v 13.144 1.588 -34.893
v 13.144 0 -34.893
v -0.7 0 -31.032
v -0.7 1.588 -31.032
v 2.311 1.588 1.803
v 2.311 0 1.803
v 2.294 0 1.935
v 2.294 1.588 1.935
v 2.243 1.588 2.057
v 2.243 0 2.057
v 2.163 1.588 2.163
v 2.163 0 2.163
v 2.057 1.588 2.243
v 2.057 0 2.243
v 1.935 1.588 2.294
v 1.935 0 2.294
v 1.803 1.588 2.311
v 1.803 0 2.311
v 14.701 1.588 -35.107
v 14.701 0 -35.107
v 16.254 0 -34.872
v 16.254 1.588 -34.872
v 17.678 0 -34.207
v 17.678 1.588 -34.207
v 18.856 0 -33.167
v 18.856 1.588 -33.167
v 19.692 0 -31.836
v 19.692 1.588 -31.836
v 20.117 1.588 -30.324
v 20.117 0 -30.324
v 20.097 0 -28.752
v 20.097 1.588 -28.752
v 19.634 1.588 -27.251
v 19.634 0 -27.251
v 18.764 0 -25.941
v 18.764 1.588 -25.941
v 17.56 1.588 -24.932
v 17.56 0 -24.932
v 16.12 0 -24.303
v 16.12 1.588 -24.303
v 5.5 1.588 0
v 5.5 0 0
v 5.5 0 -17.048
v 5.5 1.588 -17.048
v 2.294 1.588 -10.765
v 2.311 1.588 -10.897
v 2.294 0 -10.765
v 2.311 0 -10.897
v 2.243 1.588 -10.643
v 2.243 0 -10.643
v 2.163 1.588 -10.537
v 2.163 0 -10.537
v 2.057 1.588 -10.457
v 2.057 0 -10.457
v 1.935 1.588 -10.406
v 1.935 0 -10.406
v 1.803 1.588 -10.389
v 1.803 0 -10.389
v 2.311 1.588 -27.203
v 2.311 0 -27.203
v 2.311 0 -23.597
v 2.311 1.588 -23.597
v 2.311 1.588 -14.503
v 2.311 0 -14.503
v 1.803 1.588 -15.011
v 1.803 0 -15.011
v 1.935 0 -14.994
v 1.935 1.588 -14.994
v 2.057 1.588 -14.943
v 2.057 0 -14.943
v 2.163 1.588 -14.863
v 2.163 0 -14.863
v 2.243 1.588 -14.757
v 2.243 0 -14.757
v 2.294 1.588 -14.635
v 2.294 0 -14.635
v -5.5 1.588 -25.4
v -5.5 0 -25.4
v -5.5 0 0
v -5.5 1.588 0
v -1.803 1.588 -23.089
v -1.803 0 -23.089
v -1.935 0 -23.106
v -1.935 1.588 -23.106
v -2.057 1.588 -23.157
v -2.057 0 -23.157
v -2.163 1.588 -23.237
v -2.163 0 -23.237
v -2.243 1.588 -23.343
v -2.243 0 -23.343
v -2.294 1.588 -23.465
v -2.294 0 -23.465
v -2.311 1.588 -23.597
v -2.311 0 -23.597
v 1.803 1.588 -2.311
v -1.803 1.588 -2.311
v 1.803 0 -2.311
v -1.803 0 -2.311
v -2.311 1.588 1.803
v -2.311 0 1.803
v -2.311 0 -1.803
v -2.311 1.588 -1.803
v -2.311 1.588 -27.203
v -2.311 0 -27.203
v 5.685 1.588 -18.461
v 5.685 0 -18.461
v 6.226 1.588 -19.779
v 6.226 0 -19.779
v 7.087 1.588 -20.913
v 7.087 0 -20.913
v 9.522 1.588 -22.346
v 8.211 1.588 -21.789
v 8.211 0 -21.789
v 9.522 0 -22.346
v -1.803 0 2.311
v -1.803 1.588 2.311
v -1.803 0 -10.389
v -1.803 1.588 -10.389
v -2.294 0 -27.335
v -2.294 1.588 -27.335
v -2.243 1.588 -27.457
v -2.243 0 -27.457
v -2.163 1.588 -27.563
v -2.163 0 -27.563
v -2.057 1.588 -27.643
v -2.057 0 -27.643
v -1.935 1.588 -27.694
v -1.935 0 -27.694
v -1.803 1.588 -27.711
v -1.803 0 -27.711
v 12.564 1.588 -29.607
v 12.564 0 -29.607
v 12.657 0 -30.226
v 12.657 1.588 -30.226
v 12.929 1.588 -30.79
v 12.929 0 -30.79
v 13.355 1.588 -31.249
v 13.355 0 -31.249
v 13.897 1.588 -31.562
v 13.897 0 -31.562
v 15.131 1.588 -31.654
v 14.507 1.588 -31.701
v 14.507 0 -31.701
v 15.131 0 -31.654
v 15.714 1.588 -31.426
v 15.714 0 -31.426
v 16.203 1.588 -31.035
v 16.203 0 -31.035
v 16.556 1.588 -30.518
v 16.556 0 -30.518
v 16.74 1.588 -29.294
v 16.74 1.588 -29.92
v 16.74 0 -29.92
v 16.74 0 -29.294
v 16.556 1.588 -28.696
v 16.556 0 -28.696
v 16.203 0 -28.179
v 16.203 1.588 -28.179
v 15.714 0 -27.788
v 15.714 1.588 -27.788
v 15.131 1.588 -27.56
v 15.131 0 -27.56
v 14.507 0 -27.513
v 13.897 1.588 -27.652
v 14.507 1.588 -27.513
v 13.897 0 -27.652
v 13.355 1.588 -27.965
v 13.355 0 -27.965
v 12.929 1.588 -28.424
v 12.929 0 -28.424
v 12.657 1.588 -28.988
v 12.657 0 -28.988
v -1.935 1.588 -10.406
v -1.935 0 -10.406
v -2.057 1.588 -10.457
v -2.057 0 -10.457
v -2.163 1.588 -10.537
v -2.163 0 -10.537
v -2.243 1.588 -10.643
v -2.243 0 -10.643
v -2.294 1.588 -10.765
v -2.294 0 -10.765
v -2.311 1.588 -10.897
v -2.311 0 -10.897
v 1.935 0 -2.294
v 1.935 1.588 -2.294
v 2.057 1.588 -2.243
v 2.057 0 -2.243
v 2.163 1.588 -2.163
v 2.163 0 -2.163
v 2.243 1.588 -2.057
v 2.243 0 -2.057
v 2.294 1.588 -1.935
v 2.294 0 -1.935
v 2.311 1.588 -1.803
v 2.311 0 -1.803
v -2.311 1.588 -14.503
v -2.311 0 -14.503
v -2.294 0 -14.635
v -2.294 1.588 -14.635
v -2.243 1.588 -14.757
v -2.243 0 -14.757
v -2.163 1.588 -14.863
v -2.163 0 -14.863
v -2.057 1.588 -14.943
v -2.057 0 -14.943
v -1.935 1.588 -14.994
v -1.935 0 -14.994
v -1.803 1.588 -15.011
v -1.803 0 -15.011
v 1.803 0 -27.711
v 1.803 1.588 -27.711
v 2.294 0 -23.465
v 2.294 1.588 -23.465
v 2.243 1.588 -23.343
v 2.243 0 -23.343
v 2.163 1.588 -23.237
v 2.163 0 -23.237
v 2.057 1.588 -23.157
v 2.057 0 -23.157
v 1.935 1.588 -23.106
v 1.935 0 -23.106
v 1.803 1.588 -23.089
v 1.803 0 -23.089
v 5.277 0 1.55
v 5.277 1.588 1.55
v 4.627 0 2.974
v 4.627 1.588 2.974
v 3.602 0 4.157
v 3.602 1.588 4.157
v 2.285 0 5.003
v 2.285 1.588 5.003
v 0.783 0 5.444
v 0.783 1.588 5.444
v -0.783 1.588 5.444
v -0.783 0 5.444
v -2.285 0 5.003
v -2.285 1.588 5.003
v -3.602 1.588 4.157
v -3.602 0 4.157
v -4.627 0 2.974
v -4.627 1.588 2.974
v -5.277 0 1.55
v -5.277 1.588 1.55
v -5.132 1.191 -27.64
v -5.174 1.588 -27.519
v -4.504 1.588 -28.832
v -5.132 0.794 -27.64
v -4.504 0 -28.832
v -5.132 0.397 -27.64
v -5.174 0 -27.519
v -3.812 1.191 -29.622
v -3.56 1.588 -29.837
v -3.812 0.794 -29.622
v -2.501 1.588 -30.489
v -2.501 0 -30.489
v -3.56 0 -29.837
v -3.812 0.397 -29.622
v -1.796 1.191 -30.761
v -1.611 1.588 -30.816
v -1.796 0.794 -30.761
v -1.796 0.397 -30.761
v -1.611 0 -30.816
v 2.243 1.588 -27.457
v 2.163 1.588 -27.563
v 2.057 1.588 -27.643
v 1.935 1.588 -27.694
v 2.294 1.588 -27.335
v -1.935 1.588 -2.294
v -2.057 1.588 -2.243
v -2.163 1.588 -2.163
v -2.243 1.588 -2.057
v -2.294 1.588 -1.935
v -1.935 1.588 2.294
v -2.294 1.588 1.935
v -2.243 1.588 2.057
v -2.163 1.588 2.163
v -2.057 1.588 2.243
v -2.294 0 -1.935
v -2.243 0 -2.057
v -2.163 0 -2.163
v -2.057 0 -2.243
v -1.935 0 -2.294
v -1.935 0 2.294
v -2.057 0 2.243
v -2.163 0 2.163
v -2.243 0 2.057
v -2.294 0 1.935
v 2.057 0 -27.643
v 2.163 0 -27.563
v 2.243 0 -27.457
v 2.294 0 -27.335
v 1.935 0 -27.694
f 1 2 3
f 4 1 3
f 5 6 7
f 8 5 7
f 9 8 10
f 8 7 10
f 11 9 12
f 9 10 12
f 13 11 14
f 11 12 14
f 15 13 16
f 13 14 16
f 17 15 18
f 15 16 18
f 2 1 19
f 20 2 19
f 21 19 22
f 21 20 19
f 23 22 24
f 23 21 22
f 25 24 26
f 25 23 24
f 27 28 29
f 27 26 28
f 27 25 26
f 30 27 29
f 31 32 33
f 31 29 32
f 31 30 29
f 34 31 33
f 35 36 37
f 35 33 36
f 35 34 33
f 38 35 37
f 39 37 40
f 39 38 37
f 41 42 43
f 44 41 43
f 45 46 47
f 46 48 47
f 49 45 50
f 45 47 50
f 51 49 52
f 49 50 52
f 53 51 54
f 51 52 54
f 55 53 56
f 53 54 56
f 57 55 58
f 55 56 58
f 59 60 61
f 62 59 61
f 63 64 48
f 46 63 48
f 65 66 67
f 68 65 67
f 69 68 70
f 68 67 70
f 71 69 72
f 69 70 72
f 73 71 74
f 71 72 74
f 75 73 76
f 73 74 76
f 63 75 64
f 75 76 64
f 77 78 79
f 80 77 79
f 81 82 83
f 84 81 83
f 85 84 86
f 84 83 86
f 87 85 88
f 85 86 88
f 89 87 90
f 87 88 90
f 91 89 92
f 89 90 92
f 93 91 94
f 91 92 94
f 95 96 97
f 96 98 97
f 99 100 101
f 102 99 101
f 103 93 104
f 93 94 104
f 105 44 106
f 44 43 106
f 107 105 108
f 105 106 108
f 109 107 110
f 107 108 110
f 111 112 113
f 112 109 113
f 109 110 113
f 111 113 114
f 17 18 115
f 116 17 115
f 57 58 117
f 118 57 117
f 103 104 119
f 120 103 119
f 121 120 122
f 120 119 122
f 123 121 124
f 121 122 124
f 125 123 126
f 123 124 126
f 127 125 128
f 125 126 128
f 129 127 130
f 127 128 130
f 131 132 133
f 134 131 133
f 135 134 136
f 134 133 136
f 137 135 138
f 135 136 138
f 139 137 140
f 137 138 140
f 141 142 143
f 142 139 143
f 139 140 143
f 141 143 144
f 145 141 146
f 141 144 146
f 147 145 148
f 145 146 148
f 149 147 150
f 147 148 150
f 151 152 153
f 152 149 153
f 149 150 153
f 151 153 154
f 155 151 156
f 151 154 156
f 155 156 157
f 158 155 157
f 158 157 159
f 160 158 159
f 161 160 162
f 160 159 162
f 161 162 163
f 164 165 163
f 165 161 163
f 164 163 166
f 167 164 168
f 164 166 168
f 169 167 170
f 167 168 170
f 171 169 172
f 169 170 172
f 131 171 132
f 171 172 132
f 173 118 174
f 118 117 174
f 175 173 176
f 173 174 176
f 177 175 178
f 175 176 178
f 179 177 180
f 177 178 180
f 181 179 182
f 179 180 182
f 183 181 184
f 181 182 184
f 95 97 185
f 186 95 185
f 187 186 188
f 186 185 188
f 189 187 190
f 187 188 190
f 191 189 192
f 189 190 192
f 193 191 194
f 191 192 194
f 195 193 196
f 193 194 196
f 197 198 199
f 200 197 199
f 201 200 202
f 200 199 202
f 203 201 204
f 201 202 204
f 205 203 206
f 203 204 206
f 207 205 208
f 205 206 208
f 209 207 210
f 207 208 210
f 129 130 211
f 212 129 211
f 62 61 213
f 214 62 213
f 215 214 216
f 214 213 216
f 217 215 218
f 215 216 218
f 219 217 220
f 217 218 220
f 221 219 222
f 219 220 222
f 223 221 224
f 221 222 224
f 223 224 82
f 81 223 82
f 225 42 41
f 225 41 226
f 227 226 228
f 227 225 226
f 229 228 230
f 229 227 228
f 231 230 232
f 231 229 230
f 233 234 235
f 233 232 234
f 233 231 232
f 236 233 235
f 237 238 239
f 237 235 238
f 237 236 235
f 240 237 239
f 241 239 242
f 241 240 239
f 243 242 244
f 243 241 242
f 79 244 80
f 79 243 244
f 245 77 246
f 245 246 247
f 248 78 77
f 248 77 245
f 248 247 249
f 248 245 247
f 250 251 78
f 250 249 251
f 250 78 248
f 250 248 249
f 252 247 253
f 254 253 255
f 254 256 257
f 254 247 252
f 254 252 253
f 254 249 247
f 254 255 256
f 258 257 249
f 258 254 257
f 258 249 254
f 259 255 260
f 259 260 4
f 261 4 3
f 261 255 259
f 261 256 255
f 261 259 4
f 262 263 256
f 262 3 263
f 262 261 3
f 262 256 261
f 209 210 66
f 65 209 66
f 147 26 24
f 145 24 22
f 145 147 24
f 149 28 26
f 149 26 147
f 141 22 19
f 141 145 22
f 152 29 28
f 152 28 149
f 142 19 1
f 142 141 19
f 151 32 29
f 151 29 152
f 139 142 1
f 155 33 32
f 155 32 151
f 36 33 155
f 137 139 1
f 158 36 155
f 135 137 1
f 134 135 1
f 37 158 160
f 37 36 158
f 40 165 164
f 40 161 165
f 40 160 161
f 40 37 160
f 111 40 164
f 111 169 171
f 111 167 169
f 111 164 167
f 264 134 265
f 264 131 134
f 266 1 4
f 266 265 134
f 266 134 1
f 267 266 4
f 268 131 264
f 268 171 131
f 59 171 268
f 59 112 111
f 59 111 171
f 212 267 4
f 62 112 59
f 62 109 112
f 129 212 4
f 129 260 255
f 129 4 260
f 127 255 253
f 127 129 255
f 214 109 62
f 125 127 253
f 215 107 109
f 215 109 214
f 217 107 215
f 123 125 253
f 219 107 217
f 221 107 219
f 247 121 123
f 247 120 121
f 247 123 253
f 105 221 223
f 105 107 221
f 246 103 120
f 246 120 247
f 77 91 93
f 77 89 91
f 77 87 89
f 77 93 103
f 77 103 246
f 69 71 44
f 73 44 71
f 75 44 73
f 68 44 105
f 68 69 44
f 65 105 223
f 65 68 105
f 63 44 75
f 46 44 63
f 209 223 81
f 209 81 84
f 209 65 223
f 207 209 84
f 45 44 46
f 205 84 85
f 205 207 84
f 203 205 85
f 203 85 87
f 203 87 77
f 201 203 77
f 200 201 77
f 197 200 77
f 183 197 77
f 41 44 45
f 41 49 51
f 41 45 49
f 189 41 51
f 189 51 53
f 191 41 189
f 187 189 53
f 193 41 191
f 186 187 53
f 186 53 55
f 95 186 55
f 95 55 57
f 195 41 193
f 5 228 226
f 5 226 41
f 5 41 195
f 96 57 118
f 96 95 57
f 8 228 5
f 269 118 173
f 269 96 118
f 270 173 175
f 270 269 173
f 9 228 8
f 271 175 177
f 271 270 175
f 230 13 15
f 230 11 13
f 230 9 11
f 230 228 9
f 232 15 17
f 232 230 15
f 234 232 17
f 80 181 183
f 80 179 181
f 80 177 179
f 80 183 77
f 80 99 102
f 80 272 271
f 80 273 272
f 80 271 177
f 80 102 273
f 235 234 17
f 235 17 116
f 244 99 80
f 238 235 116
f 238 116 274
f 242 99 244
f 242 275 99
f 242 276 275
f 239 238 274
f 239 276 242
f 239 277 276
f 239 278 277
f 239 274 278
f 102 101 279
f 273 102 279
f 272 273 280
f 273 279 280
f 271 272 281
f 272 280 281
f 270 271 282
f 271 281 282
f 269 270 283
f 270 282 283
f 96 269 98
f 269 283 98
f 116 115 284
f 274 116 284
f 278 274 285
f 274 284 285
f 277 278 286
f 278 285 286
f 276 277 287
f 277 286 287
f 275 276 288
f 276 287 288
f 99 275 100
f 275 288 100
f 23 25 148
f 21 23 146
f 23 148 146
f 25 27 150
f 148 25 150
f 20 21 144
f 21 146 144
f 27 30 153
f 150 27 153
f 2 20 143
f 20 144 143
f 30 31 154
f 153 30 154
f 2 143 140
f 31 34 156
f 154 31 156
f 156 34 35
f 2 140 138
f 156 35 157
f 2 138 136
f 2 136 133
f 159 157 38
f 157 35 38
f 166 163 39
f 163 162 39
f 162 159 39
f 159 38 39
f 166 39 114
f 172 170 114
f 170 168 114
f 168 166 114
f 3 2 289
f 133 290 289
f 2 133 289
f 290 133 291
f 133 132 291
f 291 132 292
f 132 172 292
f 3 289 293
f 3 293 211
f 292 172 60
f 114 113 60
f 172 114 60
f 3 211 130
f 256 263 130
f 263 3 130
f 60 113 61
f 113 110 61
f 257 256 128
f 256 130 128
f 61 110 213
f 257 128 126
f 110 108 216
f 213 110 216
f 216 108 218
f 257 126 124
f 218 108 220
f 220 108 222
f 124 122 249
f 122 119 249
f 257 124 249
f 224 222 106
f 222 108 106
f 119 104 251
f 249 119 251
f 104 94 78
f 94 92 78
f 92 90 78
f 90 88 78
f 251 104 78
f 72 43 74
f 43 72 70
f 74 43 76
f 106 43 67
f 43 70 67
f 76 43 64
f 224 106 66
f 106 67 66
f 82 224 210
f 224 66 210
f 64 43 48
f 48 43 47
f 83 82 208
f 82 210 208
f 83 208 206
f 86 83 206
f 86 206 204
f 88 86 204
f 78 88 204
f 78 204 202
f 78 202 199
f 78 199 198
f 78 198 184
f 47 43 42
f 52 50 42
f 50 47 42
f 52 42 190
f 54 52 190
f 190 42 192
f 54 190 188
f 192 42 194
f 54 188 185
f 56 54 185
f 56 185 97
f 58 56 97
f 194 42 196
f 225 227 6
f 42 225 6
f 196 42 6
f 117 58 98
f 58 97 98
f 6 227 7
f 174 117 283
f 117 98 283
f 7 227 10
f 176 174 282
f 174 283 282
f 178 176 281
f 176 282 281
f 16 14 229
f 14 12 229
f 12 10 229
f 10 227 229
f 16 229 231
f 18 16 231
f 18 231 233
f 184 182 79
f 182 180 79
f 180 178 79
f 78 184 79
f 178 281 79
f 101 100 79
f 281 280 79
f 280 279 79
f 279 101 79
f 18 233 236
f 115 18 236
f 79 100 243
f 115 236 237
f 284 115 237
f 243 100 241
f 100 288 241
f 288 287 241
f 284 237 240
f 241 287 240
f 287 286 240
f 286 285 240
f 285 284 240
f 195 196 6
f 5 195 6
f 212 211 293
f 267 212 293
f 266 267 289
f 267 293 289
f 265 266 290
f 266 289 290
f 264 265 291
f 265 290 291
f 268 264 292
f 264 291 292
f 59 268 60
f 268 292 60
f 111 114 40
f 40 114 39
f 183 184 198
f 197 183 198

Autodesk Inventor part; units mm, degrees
ref_plane "YZ Plane" through (0, 0, 0) normal (1, 0, 0) x (0, 1, 0)
ref_plane "XZ Plane" through (0, 0, 0) normal (0, 1, 0) x (-1, 0, 0)
ref_plane "XY Plane" through (0, 0, 0) normal (0, 0, 1) x (1, 0, 0)
sketch "main" plane through (0, 0, 0) normal (0, 0, 1) x (1, 0, 0)
  line L0 (-3.1973, -8.3156) -> (0.4095, -8.3156)
  arc A0 (-3.1973, -8.3156) -> (-3.7053, -8.8236) centre (-3.1973, -8.8236) ccw
  arc A1 (0.9175, -8.8236) -> (0.4095, -8.3156) centre (0.4095, -8.8236) ccw
  line L1 (-3.7053, -12.4304) -> (-3.7053, -8.8236)
  line L2 (0.9175, -8.8236) -> (0.9175, -12.4304)
  arc A2 (-3.7053, -12.4304) -> (-3.1973, -12.9384) centre (-3.1973, -12.4304) ccw
  line L3 (0.4095, -12.9384) -> (-3.1973, -12.9384)
  arc A3 (0.4095, -12.9384) -> (0.9175, -12.4304) centre (0.4095, -12.4304) ccw
  spline S0 degree 3 poles (4.1061, -10.627) (4.0635, -11.3826) (3.9418, -12.8881) (2.5369, -15.0176) (0.7715, -15.9468) (-0.3245, -16.1781) (-0.6942, -16.259) knots 0 0 0 0 0.294694 0.589389 0.884083 1.03143 1.03143 1.03143 1.03143
  arc A4 (-10.9164, -7.5728) -> (-6.8939, -2.275) centre (-12.3939, -2.275) ccw
  line L4 (-14.5376, -20.1198) -> (-0.6942, -16.259)
  line L5 (-10.9164, -7.5728) -> (-17.5138, -9.5303)
  arc A5 (-17.5138, -9.5303) -> (-14.5376, -20.1198) centre (-16.0578, -14.834) ccw
  circle A6 centre (-16.0578, -14.834) radius 2.1
  line L6 (0.4095, -0.2384) -> (-3.1973, -0.2384)
  arc A7 (-3.7053, 0.2696) -> (-3.1973, -0.2384) centre (-3.1973, 0.2696) ccw
  line L7 (0.9175, 3.8764) -> (0.9175, 0.2696)
  line L8 (-3.7053, 0.2696) -> (-3.7053, 3.8764)
  line L9 (-3.1973, 4.3844) -> (0.4095, 4.3844)
  arc A8 (-3.1973, 4.3844) -> (-3.7053, 3.8764) centre (-3.1973, 3.8764) ccw
  arc A9 (0.9175, 3.8764) -> (0.4095, 4.3844) centre (0.4095, 3.8764) ccw
  arc A10 (0.4095, -0.2384) -> (0.9175, 0.2696) centre (0.4095, 0.2696) ccw
  line L10 (4.1061, -10.627) -> (4.1061, 14.773)
  arc A11 (4.1061, 14.773) -> (-6.8939, 14.773) centre (-1.3939, 14.773) ccw
  line L11 (-6.8939, 14.773) -> (-6.8939, -2.275)
  line L12 (0.4095, 12.4616) -> (-3.1973, 12.4616)
  arc A12 (0.4095, 12.4616) -> (0.9175, 12.9696) centre (0.4095, 12.9696) ccw
  arc A13 (-3.7053, 12.9696) -> (-3.1973, 12.4616) centre (-3.1973, 12.9696) ccw
  line L13 (0.9175, 16.5764) -> (0.9175, 12.9696)
  line L14 (-3.7053, 12.9696) -> (-3.7053, 16.5764)
  arc A14 (-3.1973, 17.0844) -> (-3.7053, 16.5764) centre (-3.1973, 16.5764) ccw
  arc A15 (0.9175, 16.5764) -> (0.4095, 17.0844) centre (0.4095, 16.5764) ccw
  line L15 (-3.1973, 17.0844) -> (0.4095, 17.0844)
  line L16 (-15.2156, -14.4817) -> (-14.3027, -14.4817) construction
  point P0 (-2.9609, 0.4438)
  point P1 (-20.5005, 14.8552)
  dimension "d8" = 5.5
sketch "Sketch1" plane through (0, 0, 0) normal (0, 1, 0) x (-1, 0, 0)
  line L0 (-1.8034, -23.0886) -> (1.8034, -23.0886)
  arc A0 (-1.8034, -23.0886) -> (-2.3114, -23.5966) centre (-1.8034, -23.5966) ccw
  arc A1 (2.3114, -23.5966) -> (1.8034, -23.0886) centre (1.8034, -23.5966) ccw
  line L1 (-2.3114, -27.2034) -> (-2.3114, -23.5966)
  line L2 (2.3114, -23.5966) -> (2.3114, -27.2034)
  arc A2 (-2.3114, -27.2034) -> (-1.8034, -27.7114) centre (-1.8034, -27.2034) ccw
  line L3 (1.8034, -27.7114) -> (-1.8034, -27.7114)
  arc A3 (1.8034, -27.7114) -> (2.3114, -27.2034) centre (1.8034, -27.2034) ccw
  spline S0 degree 3 poles (5.5, -25.4) (5.4573, -26.1557) (5.3357, -27.6611) (3.9308, -29.7907) (2.1654, -30.7198) (1.0693, -30.9511) (0.6997, -31.0321) knots 0 0 0 0 0.294694 0.589389 0.884083 1.03143 1.03143 1.03143 1.03143
  arc A4 (-9.5225, -22.3458) -> (-5.5, -17.048) centre (-11, -17.048) ccw
  line L4 (-13.1438, -34.8928) -> (0.6997, -31.0321)
  line L5 (-9.5225, -22.3458) -> (-16.12, -24.3033)
  arc A5 (-16.12, -24.3033) -> (-13.1438, -34.8928) centre (-14.6639, -29.6071) ccw
  circle A6 centre (-14.6639, -29.6071) radius 2.1
  line L6 (1.8034, -15.0114) -> (-1.8034, -15.0114)
  arc A7 (-2.3114, -14.5034) -> (-1.8034, -15.0114) centre (-1.8034, -14.5034) ccw
  line L7 (2.3114, -10.8966) -> (2.3114, -14.5034)
  line L8 (-2.3114, -14.5034) -> (-2.3114, -10.8966)
  line L9 (-1.8034, -10.3886) -> (1.8034, -10.3886)
  arc A8 (-1.8034, -10.3886) -> (-2.3114, -10.8966) centre (-1.8034, -10.8966) ccw
  arc A9 (2.3114, -10.8966) -> (1.8034, -10.3886) centre (1.8034, -10.8966) ccw
  arc A10 (1.8034, -15.0114) -> (2.3114, -14.5034) centre (1.8034, -14.5034) ccw
  line L10 (5.5, -25.4) -> (5.5, 0)
  arc A11 (5.5, 0) -> (-5.5, 0) centre (0, 0) ccw
  line L11 (-5.5, 0) -> (-5.5, -17.048)
  line L12 (1.8034, -2.3114) -> (-1.8034, -2.3114)
  arc A12 (1.8034, -2.3114) -> (2.3114, -1.8034) centre (1.8034, -1.8034) ccw
  arc A13 (-2.3114, -1.8034) -> (-1.8034, -2.3114) centre (-1.8034, -1.8034) ccw
  line L13 (2.3114, 1.8034) -> (2.3114, -1.8034)
  line L14 (-2.3114, -1.8034) -> (-2.3114, 1.8034)
  arc A14 (-1.8034, 2.3114) -> (-2.3114, 1.8034) centre (-1.8034, 1.8034) ccw
  arc A15 (2.3114, 1.8034) -> (1.8034, 2.3114) centre (1.8034, 1.8034) ccw
  line L15 (-1.8034, 2.3114) -> (1.8034, 2.3114)
  line L16 (-13.8217, -29.2547) -> (-12.9088, -29.2547) construction
extrude "Extrusion1" add sketch "Sketch1" along normal blind 1.5875
properties part number "bent_gusset" material "Acetal Resin, White"
